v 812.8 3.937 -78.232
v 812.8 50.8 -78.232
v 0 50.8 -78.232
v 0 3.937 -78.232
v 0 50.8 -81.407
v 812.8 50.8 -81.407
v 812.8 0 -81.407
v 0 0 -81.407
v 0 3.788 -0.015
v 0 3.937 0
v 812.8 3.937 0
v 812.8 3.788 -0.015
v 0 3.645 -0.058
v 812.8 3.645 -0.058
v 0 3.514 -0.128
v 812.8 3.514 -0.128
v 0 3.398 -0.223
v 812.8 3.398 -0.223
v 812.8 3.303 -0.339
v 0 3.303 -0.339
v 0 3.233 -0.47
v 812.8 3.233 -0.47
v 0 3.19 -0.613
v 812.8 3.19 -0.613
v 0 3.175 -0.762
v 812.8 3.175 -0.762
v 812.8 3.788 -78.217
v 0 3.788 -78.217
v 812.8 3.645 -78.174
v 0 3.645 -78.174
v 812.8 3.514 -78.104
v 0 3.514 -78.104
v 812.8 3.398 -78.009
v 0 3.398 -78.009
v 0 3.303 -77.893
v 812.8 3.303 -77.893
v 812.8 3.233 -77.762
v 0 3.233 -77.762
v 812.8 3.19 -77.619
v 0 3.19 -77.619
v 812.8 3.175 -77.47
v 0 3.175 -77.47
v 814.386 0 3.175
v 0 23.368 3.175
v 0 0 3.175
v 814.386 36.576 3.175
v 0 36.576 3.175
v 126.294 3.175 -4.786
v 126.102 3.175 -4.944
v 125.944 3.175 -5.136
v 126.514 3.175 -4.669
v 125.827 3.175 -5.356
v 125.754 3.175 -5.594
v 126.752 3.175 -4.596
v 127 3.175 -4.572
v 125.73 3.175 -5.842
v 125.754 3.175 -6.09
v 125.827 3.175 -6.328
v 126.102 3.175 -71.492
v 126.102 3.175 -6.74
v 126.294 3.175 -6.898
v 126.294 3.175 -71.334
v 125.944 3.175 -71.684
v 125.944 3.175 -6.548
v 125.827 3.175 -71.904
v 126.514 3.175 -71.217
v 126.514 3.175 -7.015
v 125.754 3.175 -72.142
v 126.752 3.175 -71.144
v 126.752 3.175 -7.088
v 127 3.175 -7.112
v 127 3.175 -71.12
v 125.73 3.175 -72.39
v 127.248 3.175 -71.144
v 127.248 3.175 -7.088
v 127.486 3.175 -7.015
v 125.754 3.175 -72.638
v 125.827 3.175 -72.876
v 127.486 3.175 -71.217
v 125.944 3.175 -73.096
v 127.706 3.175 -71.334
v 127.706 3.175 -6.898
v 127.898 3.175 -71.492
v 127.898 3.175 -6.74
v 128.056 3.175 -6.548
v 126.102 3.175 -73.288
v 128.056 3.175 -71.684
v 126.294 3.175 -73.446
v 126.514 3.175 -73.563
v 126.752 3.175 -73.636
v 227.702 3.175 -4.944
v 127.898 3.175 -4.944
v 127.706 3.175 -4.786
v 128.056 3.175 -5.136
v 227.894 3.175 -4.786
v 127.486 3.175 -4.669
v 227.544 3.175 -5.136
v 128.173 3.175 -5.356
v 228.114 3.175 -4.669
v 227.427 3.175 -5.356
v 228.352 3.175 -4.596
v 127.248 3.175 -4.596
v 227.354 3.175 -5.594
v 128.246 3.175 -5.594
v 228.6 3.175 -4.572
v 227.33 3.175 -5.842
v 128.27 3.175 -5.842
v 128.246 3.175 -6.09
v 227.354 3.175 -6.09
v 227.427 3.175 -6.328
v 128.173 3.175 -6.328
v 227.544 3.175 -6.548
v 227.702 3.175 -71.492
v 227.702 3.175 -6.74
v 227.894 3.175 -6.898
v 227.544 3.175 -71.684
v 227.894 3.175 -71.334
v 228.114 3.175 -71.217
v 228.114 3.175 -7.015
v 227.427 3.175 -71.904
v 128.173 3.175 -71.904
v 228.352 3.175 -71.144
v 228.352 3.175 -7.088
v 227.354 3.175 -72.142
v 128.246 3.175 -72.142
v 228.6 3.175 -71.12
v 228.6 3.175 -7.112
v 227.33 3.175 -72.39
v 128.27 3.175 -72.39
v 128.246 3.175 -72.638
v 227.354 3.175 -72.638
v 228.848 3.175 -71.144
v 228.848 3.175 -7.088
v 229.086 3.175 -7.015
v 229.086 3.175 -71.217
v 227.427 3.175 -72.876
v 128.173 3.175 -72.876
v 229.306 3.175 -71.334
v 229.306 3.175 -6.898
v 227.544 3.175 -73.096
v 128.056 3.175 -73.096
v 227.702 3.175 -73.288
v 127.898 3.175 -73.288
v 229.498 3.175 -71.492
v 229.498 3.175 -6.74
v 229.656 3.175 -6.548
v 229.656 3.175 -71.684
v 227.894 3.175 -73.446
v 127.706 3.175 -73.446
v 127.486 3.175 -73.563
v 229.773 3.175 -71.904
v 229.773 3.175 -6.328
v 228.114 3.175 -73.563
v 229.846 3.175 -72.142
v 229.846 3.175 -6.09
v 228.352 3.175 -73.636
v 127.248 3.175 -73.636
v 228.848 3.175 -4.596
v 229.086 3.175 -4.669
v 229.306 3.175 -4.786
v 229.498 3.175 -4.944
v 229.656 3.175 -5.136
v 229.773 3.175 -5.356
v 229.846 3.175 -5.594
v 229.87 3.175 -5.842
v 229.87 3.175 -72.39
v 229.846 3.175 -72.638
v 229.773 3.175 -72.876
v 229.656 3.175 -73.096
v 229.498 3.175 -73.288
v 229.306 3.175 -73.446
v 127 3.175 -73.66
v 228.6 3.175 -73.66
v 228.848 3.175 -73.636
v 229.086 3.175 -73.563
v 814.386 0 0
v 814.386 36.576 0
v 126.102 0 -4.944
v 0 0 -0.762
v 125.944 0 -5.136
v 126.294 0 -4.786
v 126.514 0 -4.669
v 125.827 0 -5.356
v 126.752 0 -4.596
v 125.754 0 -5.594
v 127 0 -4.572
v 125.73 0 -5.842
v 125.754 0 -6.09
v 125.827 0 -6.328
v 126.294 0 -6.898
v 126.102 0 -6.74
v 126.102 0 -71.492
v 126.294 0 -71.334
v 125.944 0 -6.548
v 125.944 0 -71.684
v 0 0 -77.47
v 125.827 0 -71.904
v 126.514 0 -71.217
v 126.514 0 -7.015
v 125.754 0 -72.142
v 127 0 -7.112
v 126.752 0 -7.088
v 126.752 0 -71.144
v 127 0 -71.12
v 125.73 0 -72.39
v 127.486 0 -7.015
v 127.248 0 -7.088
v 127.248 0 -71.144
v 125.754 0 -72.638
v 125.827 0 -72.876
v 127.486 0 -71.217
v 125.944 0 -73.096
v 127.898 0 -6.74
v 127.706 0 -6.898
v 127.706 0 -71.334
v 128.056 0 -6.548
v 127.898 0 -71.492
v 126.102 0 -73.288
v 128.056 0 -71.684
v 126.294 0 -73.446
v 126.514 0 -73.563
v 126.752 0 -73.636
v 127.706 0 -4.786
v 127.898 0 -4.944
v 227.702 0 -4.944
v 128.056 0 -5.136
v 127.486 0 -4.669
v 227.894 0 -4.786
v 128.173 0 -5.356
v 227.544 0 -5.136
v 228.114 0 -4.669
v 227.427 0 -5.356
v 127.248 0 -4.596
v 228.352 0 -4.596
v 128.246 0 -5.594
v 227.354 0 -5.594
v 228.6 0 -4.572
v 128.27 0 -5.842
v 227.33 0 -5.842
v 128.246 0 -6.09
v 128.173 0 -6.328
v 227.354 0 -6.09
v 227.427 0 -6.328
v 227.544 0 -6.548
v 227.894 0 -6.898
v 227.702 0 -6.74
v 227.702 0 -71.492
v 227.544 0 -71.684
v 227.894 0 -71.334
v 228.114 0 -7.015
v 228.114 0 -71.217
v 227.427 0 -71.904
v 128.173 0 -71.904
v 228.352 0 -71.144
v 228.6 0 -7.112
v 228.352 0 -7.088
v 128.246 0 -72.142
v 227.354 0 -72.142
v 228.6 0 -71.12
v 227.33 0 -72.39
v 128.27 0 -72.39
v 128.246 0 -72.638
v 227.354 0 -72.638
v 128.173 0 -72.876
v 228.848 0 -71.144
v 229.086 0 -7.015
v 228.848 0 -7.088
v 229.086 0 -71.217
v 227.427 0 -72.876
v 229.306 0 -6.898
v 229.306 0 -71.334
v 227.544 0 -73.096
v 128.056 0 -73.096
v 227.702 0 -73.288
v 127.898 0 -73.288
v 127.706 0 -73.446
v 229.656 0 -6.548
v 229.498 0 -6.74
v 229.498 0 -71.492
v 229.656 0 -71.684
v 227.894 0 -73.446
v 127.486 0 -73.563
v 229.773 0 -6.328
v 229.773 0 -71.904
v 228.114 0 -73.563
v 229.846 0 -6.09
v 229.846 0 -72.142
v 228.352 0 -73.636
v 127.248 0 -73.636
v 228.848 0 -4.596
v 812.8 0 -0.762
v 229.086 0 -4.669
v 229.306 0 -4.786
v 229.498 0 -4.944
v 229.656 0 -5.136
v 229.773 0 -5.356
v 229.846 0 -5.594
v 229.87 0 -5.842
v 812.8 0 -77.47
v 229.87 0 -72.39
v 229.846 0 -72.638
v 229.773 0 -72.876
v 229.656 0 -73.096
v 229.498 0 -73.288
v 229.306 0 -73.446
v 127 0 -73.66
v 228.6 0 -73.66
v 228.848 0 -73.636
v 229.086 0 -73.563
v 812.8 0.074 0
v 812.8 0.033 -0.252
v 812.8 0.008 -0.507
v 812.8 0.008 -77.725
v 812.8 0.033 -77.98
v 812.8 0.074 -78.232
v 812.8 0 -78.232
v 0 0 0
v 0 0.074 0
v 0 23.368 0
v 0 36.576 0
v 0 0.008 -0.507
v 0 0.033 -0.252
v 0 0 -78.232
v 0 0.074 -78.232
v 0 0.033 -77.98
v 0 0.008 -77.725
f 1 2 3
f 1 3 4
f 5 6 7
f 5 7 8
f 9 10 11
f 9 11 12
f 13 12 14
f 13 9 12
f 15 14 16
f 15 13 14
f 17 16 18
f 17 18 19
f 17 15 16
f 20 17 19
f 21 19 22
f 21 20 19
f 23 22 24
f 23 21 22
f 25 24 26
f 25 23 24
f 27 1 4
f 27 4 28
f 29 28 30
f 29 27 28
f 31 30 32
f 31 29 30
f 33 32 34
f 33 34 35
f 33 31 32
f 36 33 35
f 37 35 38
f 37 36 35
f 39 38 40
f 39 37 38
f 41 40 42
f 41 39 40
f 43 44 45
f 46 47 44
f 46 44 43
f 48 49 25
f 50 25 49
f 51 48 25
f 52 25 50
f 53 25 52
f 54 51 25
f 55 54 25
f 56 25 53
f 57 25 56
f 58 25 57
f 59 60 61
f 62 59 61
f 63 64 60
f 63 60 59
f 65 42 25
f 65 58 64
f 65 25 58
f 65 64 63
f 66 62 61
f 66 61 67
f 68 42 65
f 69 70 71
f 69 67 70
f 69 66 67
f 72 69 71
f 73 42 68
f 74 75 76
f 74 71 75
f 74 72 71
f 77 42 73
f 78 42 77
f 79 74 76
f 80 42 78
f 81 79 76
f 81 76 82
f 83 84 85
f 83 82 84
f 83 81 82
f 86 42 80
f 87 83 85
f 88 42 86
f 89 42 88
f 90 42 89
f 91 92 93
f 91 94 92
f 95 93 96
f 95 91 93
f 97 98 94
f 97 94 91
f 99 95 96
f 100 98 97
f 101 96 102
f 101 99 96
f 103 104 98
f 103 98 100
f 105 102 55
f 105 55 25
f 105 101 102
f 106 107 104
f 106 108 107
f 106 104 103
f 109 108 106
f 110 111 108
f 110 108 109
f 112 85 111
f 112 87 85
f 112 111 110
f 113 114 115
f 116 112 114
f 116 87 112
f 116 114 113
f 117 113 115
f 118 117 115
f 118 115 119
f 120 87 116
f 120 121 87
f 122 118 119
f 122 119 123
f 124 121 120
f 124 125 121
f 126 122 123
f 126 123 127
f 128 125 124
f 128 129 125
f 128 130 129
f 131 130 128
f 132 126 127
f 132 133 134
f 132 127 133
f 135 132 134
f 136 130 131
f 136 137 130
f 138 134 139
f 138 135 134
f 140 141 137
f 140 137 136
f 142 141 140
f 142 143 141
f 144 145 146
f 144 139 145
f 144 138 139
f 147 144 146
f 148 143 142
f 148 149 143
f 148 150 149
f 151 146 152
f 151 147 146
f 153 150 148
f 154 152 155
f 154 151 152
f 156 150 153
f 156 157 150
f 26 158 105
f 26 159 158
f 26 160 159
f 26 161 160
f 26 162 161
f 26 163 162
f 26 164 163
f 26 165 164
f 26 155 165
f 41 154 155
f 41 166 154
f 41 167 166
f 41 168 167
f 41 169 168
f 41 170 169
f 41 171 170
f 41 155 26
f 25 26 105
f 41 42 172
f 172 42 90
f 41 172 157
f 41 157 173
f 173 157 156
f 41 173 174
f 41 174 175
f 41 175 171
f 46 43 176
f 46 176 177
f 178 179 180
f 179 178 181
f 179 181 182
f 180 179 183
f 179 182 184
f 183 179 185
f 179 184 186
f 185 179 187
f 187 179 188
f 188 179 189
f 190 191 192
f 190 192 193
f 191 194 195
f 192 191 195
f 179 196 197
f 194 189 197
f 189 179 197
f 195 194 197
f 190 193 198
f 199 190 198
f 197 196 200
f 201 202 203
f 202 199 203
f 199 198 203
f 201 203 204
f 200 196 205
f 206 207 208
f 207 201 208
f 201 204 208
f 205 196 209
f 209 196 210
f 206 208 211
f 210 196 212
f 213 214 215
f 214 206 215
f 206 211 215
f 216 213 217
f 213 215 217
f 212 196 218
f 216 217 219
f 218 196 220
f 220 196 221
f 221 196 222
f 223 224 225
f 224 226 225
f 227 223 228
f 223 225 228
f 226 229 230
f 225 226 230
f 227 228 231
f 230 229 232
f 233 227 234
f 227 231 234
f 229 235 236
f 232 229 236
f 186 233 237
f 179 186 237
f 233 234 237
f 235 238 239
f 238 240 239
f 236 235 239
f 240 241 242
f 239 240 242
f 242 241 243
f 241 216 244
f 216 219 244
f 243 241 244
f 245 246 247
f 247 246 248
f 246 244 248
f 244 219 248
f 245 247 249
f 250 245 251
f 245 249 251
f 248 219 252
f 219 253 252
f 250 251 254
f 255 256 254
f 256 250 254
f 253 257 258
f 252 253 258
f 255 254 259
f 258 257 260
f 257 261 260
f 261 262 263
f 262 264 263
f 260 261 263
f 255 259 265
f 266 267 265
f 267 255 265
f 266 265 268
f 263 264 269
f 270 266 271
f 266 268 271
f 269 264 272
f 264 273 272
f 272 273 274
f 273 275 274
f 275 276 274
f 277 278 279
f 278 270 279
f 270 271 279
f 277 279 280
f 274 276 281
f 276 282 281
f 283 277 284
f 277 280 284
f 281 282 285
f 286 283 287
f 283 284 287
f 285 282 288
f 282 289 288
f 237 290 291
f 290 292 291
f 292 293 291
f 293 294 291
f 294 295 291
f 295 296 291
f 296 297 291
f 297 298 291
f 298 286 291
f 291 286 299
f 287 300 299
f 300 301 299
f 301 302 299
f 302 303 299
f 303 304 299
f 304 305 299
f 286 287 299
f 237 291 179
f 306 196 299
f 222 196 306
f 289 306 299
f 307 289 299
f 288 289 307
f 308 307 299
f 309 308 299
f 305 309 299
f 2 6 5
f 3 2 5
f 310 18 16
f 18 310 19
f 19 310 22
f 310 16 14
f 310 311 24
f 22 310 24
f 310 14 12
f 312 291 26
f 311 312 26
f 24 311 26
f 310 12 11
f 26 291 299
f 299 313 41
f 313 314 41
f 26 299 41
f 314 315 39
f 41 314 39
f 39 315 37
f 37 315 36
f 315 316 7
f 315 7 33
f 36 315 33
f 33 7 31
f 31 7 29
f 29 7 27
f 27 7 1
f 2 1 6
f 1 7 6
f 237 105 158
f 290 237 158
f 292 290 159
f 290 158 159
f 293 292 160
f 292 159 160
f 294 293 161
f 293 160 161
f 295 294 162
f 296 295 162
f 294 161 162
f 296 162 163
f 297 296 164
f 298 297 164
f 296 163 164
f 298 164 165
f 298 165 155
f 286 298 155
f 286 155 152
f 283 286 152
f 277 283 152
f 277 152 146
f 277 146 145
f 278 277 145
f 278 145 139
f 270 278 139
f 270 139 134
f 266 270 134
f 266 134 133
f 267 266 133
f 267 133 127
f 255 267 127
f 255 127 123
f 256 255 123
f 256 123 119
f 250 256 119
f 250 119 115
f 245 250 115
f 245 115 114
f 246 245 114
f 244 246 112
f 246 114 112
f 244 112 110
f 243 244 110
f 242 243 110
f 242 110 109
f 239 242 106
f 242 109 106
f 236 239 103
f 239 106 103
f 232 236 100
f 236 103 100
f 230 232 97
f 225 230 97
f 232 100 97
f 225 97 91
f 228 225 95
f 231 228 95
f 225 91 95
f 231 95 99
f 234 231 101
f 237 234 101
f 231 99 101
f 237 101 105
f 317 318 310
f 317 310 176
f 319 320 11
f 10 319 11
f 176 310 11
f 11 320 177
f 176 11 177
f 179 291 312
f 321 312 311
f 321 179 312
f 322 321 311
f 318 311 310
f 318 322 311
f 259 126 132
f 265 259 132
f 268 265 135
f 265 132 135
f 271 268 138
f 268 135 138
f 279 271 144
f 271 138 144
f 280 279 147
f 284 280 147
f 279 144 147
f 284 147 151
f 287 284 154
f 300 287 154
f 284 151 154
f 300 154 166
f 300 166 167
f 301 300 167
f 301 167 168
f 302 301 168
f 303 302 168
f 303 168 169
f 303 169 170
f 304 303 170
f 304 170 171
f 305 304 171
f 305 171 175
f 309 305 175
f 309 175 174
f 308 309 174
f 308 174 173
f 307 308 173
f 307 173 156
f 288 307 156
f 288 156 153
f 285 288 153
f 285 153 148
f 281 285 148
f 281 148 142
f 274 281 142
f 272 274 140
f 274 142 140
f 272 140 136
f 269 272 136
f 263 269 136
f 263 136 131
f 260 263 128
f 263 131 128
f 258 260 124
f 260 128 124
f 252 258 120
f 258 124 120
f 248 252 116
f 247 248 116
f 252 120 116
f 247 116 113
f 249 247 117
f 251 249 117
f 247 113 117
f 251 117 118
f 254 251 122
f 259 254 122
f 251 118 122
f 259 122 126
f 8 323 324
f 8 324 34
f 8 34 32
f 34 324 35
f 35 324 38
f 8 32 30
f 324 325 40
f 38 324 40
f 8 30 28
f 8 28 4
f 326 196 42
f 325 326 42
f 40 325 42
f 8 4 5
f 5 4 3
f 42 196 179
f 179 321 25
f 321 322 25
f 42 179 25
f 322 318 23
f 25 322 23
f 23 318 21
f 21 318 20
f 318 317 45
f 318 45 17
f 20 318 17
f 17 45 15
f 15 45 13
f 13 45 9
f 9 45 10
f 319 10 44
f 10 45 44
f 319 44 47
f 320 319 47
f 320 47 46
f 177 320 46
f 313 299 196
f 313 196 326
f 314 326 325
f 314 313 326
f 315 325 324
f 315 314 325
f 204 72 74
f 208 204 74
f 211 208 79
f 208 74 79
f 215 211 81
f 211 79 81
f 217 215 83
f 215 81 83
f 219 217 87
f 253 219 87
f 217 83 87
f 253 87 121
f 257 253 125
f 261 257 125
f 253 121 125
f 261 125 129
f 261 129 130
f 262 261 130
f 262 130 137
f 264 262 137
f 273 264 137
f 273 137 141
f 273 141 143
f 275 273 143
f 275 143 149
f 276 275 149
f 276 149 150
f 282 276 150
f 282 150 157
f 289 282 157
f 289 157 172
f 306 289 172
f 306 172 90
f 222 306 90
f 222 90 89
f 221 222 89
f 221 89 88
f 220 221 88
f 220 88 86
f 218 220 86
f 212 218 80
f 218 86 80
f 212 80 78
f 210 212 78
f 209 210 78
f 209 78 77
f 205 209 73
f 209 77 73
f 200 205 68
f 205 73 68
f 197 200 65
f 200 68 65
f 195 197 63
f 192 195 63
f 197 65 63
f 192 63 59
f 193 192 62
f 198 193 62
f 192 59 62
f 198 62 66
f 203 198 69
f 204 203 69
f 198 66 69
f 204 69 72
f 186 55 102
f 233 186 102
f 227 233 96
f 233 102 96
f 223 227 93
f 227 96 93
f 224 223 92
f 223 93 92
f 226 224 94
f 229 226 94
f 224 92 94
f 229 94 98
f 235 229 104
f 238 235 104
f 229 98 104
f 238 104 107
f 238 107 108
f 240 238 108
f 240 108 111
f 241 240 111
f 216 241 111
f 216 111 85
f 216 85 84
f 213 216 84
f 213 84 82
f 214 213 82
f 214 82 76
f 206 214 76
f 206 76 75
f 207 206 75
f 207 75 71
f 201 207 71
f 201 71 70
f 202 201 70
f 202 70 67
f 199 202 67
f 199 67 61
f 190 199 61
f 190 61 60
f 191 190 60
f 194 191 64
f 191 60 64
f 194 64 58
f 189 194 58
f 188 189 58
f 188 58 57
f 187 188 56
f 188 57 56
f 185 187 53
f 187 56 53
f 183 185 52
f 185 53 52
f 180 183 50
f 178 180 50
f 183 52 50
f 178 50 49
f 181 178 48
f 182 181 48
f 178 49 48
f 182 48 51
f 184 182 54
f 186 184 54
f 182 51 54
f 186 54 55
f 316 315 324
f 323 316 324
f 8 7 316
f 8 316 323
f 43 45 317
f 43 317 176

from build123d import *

# Parameters (mm, degrees)
SKETCH1_W                    = 812.8
SKETCH1_H                    = 78.232
BOSS_EXTRUDE1_DEPTH          = 3.175
EDGE_FLANGE1_STRIP_W         = 14.224
EDGE_FLANGE1_STRIP_H         = 3.175
EDGE_FLANGE1_STRIP_CUT_DEPTH = 812.8
EDGE_FLANGE1_DEPTH           = 812.8
EDGE_FLANGE2_STRIP_W         = 14.224
EDGE_FLANGE2_STRIP_H         = 3.175
EDGE_FLANGE2_STRIP_CUT_DEPTH = 812.8
EDGE_FLANGE2_DEPTH           = 812.8
SKETCH9_R                    = 2.667
CUT_EXTRUDE1_DEPTH           = 818.620012948
CHAMFER1_SIZE                = 3.175
SKETCH12_R                   = 1.27
CUT_EXTRUDE4_DEPTH           = 818.20071162
SKETCH15_W                   = 812.8
SKETCH15_H                   = 50.8
BOSS_EXTRUDE2_DEPTH          = 3.175
SKETCH16_W                   = 814.386282527
SKETCH16_H                   = 36.576
BOSS_EXTRUDE3_DEPTH          = 3.175


# Sheet-metal steps are written as plain solids
with BuildPart() as part:
    # Sketch1 → Boss-Extrude1 (new body)
    with BuildSketch(Plane(origin=(0, 0, 0), x_dir=(1, 0, 0), z_dir=(0, 1, 0))):
        with Locations((406.4, 39.116)):
            Rectangle(SKETCH1_W, SKETCH1_H)
    extrude(amount=BOSS_EXTRUDE1_DEPTH)

    # Edge-Flange1 strip (across the edge) → Edge-Flange1 strip cut (cut)
    with BuildSketch(Plane(origin=(812.8, 3.175, -78.232), x_dir=(0, 0, 1), z_dir=(-1, 0, 0))):
        with Locations((-6.35, -1.5875)):
            Rectangle(EDGE_FLANGE1_STRIP_W, EDGE_FLANGE1_STRIP_H)
    extrude(amount=EDGE_FLANGE1_STRIP_CUT_DEPTH, mode=Mode.SUBTRACT)

    # Edge-Flange1 section (across the edge) → Edge-Flange1 (add)
    with BuildSketch(Plane(origin=(812.8, 3.175, -78.232), x_dir=(0, 0, 1), z_dir=(-1, 0, 0))):
        with BuildLine():
            Line((-3.175, 0.762), (-3.175, 23.368))
            Line((-3.175, 23.368), (0, 23.368))
            Line((0, 23.368), (0, 0.762))
            ThreePointArc((0, 0.762), (0.223184633, 0.223184633), (0.762, 0))
            Line((0.762, 0), (0.762, -3.175))
            ThreePointArc((0.762, -3.175), (-2.021879398, -2.021879398), (-3.175, 0.762))
        make_face()
    extrude(amount=EDGE_FLANGE1_DEPTH)

    # Edge-Flange2 strip (across the edge) → Edge-Flange2 strip cut (cut)
    with BuildSketch(Plane(origin=(0, 3.175, 0), x_dir=(0, 0, -1), z_dir=(1, 0, 0))):
        with Locations((-6.35, -1.5875)):
            Rectangle(EDGE_FLANGE2_STRIP_W, EDGE_FLANGE2_STRIP_H)
    extrude(amount=EDGE_FLANGE2_STRIP_CUT_DEPTH, mode=Mode.SUBTRACT)

    # Edge-Flange2 section (across the edge) → Edge-Flange2 (add)
    with BuildSketch(Plane(origin=(0, 3.175, 0), x_dir=(0, 0, -1), z_dir=(1, 0, 0))):
        with BuildLine():
            Line((-3.175, 0.762), (-3.175, 23.368))
            Line((-3.175, 23.368), (0, 23.368))
            Line((0, 23.368), (0, 0.762))
            ThreePointArc((0, 0.762), (0.223184633, 0.223184633), (0.762, 0))
            Line((0.762, 0), (0.762, -3.175))
            ThreePointArc((0.762, -3.175), (-2.021879398, -2.021879398), (-3.175, 0.762))
        make_face()
    extrude(amount=EDGE_FLANGE2_DEPTH)

    # Sketch9 → Cut-Extrude1 (cut, through all)
    with BuildSketch(Plane.XY.offset(3.175)):
        with Locations((806.45, 16.637)):
            Circle(SKETCH9_R)
    extrude(amount=-CUT_EXTRUDE1_DEPTH, mode=Mode.SUBTRACT)

    # Chamfer1
    chamfer1_edges = [part.edges().sort_by_distance(p)[0] for p in [
        (812.8, 26.543, -79.8195),
        (0, 26.543, -79.8195),
        (0, 26.543, 1.5875),
        (812.8, 26.543, 1.5875),
    ]]
    chamfer(chamfer1_edges, length=CHAMFER1_SIZE)

    # Sketch12 → Cut-Extrude4 (cut, through all)
    with BuildSketch(Plane(origin=(0, 3.175, 0), x_dir=(1, 0, 0), z_dir=(0, 1, 0))):
        with Locations(Location((127, 72.39, 0), (0, 0, 270))):
            Circle(SKETCH12_R)
        with Locations(Location((228.6, 72.39, 0), (0, 0, 270))):
            Circle(SKETCH12_R)
        with Locations(Location((228.6, 5.842, 0), (0, 0, 270))):
            Circle(SKETCH12_R)
        with Locations(Location((127, 5.842, 0), (0, 0, 270))):
            Circle(SKETCH12_R)
    extrude(amount=-CUT_EXTRUDE4_DEPTH, mode=Mode.SUBTRACT)

    # Sketch15 → Boss-Extrude2 (add)
    with BuildSketch(Plane(origin=(0, 0, -81.407), x_dir=(-1, 0, 0), z_dir=(0, 0, -1))):
        with Locations((-406.4, 25.4)):
            Rectangle(SKETCH15_W, SKETCH15_H)
    extrude(amount=-BOSS_EXTRUDE2_DEPTH)

    # Sketch16 → Boss-Extrude3 (add)
    with BuildSketch(Plane.XY.offset(3.175)):
        with Locations((407.193141264, 18.288)):
            Rectangle(SKETCH16_W, SKETCH16_H)
    extrude(amount=-BOSS_EXTRUDE3_DEPTH)


solid = part.part
